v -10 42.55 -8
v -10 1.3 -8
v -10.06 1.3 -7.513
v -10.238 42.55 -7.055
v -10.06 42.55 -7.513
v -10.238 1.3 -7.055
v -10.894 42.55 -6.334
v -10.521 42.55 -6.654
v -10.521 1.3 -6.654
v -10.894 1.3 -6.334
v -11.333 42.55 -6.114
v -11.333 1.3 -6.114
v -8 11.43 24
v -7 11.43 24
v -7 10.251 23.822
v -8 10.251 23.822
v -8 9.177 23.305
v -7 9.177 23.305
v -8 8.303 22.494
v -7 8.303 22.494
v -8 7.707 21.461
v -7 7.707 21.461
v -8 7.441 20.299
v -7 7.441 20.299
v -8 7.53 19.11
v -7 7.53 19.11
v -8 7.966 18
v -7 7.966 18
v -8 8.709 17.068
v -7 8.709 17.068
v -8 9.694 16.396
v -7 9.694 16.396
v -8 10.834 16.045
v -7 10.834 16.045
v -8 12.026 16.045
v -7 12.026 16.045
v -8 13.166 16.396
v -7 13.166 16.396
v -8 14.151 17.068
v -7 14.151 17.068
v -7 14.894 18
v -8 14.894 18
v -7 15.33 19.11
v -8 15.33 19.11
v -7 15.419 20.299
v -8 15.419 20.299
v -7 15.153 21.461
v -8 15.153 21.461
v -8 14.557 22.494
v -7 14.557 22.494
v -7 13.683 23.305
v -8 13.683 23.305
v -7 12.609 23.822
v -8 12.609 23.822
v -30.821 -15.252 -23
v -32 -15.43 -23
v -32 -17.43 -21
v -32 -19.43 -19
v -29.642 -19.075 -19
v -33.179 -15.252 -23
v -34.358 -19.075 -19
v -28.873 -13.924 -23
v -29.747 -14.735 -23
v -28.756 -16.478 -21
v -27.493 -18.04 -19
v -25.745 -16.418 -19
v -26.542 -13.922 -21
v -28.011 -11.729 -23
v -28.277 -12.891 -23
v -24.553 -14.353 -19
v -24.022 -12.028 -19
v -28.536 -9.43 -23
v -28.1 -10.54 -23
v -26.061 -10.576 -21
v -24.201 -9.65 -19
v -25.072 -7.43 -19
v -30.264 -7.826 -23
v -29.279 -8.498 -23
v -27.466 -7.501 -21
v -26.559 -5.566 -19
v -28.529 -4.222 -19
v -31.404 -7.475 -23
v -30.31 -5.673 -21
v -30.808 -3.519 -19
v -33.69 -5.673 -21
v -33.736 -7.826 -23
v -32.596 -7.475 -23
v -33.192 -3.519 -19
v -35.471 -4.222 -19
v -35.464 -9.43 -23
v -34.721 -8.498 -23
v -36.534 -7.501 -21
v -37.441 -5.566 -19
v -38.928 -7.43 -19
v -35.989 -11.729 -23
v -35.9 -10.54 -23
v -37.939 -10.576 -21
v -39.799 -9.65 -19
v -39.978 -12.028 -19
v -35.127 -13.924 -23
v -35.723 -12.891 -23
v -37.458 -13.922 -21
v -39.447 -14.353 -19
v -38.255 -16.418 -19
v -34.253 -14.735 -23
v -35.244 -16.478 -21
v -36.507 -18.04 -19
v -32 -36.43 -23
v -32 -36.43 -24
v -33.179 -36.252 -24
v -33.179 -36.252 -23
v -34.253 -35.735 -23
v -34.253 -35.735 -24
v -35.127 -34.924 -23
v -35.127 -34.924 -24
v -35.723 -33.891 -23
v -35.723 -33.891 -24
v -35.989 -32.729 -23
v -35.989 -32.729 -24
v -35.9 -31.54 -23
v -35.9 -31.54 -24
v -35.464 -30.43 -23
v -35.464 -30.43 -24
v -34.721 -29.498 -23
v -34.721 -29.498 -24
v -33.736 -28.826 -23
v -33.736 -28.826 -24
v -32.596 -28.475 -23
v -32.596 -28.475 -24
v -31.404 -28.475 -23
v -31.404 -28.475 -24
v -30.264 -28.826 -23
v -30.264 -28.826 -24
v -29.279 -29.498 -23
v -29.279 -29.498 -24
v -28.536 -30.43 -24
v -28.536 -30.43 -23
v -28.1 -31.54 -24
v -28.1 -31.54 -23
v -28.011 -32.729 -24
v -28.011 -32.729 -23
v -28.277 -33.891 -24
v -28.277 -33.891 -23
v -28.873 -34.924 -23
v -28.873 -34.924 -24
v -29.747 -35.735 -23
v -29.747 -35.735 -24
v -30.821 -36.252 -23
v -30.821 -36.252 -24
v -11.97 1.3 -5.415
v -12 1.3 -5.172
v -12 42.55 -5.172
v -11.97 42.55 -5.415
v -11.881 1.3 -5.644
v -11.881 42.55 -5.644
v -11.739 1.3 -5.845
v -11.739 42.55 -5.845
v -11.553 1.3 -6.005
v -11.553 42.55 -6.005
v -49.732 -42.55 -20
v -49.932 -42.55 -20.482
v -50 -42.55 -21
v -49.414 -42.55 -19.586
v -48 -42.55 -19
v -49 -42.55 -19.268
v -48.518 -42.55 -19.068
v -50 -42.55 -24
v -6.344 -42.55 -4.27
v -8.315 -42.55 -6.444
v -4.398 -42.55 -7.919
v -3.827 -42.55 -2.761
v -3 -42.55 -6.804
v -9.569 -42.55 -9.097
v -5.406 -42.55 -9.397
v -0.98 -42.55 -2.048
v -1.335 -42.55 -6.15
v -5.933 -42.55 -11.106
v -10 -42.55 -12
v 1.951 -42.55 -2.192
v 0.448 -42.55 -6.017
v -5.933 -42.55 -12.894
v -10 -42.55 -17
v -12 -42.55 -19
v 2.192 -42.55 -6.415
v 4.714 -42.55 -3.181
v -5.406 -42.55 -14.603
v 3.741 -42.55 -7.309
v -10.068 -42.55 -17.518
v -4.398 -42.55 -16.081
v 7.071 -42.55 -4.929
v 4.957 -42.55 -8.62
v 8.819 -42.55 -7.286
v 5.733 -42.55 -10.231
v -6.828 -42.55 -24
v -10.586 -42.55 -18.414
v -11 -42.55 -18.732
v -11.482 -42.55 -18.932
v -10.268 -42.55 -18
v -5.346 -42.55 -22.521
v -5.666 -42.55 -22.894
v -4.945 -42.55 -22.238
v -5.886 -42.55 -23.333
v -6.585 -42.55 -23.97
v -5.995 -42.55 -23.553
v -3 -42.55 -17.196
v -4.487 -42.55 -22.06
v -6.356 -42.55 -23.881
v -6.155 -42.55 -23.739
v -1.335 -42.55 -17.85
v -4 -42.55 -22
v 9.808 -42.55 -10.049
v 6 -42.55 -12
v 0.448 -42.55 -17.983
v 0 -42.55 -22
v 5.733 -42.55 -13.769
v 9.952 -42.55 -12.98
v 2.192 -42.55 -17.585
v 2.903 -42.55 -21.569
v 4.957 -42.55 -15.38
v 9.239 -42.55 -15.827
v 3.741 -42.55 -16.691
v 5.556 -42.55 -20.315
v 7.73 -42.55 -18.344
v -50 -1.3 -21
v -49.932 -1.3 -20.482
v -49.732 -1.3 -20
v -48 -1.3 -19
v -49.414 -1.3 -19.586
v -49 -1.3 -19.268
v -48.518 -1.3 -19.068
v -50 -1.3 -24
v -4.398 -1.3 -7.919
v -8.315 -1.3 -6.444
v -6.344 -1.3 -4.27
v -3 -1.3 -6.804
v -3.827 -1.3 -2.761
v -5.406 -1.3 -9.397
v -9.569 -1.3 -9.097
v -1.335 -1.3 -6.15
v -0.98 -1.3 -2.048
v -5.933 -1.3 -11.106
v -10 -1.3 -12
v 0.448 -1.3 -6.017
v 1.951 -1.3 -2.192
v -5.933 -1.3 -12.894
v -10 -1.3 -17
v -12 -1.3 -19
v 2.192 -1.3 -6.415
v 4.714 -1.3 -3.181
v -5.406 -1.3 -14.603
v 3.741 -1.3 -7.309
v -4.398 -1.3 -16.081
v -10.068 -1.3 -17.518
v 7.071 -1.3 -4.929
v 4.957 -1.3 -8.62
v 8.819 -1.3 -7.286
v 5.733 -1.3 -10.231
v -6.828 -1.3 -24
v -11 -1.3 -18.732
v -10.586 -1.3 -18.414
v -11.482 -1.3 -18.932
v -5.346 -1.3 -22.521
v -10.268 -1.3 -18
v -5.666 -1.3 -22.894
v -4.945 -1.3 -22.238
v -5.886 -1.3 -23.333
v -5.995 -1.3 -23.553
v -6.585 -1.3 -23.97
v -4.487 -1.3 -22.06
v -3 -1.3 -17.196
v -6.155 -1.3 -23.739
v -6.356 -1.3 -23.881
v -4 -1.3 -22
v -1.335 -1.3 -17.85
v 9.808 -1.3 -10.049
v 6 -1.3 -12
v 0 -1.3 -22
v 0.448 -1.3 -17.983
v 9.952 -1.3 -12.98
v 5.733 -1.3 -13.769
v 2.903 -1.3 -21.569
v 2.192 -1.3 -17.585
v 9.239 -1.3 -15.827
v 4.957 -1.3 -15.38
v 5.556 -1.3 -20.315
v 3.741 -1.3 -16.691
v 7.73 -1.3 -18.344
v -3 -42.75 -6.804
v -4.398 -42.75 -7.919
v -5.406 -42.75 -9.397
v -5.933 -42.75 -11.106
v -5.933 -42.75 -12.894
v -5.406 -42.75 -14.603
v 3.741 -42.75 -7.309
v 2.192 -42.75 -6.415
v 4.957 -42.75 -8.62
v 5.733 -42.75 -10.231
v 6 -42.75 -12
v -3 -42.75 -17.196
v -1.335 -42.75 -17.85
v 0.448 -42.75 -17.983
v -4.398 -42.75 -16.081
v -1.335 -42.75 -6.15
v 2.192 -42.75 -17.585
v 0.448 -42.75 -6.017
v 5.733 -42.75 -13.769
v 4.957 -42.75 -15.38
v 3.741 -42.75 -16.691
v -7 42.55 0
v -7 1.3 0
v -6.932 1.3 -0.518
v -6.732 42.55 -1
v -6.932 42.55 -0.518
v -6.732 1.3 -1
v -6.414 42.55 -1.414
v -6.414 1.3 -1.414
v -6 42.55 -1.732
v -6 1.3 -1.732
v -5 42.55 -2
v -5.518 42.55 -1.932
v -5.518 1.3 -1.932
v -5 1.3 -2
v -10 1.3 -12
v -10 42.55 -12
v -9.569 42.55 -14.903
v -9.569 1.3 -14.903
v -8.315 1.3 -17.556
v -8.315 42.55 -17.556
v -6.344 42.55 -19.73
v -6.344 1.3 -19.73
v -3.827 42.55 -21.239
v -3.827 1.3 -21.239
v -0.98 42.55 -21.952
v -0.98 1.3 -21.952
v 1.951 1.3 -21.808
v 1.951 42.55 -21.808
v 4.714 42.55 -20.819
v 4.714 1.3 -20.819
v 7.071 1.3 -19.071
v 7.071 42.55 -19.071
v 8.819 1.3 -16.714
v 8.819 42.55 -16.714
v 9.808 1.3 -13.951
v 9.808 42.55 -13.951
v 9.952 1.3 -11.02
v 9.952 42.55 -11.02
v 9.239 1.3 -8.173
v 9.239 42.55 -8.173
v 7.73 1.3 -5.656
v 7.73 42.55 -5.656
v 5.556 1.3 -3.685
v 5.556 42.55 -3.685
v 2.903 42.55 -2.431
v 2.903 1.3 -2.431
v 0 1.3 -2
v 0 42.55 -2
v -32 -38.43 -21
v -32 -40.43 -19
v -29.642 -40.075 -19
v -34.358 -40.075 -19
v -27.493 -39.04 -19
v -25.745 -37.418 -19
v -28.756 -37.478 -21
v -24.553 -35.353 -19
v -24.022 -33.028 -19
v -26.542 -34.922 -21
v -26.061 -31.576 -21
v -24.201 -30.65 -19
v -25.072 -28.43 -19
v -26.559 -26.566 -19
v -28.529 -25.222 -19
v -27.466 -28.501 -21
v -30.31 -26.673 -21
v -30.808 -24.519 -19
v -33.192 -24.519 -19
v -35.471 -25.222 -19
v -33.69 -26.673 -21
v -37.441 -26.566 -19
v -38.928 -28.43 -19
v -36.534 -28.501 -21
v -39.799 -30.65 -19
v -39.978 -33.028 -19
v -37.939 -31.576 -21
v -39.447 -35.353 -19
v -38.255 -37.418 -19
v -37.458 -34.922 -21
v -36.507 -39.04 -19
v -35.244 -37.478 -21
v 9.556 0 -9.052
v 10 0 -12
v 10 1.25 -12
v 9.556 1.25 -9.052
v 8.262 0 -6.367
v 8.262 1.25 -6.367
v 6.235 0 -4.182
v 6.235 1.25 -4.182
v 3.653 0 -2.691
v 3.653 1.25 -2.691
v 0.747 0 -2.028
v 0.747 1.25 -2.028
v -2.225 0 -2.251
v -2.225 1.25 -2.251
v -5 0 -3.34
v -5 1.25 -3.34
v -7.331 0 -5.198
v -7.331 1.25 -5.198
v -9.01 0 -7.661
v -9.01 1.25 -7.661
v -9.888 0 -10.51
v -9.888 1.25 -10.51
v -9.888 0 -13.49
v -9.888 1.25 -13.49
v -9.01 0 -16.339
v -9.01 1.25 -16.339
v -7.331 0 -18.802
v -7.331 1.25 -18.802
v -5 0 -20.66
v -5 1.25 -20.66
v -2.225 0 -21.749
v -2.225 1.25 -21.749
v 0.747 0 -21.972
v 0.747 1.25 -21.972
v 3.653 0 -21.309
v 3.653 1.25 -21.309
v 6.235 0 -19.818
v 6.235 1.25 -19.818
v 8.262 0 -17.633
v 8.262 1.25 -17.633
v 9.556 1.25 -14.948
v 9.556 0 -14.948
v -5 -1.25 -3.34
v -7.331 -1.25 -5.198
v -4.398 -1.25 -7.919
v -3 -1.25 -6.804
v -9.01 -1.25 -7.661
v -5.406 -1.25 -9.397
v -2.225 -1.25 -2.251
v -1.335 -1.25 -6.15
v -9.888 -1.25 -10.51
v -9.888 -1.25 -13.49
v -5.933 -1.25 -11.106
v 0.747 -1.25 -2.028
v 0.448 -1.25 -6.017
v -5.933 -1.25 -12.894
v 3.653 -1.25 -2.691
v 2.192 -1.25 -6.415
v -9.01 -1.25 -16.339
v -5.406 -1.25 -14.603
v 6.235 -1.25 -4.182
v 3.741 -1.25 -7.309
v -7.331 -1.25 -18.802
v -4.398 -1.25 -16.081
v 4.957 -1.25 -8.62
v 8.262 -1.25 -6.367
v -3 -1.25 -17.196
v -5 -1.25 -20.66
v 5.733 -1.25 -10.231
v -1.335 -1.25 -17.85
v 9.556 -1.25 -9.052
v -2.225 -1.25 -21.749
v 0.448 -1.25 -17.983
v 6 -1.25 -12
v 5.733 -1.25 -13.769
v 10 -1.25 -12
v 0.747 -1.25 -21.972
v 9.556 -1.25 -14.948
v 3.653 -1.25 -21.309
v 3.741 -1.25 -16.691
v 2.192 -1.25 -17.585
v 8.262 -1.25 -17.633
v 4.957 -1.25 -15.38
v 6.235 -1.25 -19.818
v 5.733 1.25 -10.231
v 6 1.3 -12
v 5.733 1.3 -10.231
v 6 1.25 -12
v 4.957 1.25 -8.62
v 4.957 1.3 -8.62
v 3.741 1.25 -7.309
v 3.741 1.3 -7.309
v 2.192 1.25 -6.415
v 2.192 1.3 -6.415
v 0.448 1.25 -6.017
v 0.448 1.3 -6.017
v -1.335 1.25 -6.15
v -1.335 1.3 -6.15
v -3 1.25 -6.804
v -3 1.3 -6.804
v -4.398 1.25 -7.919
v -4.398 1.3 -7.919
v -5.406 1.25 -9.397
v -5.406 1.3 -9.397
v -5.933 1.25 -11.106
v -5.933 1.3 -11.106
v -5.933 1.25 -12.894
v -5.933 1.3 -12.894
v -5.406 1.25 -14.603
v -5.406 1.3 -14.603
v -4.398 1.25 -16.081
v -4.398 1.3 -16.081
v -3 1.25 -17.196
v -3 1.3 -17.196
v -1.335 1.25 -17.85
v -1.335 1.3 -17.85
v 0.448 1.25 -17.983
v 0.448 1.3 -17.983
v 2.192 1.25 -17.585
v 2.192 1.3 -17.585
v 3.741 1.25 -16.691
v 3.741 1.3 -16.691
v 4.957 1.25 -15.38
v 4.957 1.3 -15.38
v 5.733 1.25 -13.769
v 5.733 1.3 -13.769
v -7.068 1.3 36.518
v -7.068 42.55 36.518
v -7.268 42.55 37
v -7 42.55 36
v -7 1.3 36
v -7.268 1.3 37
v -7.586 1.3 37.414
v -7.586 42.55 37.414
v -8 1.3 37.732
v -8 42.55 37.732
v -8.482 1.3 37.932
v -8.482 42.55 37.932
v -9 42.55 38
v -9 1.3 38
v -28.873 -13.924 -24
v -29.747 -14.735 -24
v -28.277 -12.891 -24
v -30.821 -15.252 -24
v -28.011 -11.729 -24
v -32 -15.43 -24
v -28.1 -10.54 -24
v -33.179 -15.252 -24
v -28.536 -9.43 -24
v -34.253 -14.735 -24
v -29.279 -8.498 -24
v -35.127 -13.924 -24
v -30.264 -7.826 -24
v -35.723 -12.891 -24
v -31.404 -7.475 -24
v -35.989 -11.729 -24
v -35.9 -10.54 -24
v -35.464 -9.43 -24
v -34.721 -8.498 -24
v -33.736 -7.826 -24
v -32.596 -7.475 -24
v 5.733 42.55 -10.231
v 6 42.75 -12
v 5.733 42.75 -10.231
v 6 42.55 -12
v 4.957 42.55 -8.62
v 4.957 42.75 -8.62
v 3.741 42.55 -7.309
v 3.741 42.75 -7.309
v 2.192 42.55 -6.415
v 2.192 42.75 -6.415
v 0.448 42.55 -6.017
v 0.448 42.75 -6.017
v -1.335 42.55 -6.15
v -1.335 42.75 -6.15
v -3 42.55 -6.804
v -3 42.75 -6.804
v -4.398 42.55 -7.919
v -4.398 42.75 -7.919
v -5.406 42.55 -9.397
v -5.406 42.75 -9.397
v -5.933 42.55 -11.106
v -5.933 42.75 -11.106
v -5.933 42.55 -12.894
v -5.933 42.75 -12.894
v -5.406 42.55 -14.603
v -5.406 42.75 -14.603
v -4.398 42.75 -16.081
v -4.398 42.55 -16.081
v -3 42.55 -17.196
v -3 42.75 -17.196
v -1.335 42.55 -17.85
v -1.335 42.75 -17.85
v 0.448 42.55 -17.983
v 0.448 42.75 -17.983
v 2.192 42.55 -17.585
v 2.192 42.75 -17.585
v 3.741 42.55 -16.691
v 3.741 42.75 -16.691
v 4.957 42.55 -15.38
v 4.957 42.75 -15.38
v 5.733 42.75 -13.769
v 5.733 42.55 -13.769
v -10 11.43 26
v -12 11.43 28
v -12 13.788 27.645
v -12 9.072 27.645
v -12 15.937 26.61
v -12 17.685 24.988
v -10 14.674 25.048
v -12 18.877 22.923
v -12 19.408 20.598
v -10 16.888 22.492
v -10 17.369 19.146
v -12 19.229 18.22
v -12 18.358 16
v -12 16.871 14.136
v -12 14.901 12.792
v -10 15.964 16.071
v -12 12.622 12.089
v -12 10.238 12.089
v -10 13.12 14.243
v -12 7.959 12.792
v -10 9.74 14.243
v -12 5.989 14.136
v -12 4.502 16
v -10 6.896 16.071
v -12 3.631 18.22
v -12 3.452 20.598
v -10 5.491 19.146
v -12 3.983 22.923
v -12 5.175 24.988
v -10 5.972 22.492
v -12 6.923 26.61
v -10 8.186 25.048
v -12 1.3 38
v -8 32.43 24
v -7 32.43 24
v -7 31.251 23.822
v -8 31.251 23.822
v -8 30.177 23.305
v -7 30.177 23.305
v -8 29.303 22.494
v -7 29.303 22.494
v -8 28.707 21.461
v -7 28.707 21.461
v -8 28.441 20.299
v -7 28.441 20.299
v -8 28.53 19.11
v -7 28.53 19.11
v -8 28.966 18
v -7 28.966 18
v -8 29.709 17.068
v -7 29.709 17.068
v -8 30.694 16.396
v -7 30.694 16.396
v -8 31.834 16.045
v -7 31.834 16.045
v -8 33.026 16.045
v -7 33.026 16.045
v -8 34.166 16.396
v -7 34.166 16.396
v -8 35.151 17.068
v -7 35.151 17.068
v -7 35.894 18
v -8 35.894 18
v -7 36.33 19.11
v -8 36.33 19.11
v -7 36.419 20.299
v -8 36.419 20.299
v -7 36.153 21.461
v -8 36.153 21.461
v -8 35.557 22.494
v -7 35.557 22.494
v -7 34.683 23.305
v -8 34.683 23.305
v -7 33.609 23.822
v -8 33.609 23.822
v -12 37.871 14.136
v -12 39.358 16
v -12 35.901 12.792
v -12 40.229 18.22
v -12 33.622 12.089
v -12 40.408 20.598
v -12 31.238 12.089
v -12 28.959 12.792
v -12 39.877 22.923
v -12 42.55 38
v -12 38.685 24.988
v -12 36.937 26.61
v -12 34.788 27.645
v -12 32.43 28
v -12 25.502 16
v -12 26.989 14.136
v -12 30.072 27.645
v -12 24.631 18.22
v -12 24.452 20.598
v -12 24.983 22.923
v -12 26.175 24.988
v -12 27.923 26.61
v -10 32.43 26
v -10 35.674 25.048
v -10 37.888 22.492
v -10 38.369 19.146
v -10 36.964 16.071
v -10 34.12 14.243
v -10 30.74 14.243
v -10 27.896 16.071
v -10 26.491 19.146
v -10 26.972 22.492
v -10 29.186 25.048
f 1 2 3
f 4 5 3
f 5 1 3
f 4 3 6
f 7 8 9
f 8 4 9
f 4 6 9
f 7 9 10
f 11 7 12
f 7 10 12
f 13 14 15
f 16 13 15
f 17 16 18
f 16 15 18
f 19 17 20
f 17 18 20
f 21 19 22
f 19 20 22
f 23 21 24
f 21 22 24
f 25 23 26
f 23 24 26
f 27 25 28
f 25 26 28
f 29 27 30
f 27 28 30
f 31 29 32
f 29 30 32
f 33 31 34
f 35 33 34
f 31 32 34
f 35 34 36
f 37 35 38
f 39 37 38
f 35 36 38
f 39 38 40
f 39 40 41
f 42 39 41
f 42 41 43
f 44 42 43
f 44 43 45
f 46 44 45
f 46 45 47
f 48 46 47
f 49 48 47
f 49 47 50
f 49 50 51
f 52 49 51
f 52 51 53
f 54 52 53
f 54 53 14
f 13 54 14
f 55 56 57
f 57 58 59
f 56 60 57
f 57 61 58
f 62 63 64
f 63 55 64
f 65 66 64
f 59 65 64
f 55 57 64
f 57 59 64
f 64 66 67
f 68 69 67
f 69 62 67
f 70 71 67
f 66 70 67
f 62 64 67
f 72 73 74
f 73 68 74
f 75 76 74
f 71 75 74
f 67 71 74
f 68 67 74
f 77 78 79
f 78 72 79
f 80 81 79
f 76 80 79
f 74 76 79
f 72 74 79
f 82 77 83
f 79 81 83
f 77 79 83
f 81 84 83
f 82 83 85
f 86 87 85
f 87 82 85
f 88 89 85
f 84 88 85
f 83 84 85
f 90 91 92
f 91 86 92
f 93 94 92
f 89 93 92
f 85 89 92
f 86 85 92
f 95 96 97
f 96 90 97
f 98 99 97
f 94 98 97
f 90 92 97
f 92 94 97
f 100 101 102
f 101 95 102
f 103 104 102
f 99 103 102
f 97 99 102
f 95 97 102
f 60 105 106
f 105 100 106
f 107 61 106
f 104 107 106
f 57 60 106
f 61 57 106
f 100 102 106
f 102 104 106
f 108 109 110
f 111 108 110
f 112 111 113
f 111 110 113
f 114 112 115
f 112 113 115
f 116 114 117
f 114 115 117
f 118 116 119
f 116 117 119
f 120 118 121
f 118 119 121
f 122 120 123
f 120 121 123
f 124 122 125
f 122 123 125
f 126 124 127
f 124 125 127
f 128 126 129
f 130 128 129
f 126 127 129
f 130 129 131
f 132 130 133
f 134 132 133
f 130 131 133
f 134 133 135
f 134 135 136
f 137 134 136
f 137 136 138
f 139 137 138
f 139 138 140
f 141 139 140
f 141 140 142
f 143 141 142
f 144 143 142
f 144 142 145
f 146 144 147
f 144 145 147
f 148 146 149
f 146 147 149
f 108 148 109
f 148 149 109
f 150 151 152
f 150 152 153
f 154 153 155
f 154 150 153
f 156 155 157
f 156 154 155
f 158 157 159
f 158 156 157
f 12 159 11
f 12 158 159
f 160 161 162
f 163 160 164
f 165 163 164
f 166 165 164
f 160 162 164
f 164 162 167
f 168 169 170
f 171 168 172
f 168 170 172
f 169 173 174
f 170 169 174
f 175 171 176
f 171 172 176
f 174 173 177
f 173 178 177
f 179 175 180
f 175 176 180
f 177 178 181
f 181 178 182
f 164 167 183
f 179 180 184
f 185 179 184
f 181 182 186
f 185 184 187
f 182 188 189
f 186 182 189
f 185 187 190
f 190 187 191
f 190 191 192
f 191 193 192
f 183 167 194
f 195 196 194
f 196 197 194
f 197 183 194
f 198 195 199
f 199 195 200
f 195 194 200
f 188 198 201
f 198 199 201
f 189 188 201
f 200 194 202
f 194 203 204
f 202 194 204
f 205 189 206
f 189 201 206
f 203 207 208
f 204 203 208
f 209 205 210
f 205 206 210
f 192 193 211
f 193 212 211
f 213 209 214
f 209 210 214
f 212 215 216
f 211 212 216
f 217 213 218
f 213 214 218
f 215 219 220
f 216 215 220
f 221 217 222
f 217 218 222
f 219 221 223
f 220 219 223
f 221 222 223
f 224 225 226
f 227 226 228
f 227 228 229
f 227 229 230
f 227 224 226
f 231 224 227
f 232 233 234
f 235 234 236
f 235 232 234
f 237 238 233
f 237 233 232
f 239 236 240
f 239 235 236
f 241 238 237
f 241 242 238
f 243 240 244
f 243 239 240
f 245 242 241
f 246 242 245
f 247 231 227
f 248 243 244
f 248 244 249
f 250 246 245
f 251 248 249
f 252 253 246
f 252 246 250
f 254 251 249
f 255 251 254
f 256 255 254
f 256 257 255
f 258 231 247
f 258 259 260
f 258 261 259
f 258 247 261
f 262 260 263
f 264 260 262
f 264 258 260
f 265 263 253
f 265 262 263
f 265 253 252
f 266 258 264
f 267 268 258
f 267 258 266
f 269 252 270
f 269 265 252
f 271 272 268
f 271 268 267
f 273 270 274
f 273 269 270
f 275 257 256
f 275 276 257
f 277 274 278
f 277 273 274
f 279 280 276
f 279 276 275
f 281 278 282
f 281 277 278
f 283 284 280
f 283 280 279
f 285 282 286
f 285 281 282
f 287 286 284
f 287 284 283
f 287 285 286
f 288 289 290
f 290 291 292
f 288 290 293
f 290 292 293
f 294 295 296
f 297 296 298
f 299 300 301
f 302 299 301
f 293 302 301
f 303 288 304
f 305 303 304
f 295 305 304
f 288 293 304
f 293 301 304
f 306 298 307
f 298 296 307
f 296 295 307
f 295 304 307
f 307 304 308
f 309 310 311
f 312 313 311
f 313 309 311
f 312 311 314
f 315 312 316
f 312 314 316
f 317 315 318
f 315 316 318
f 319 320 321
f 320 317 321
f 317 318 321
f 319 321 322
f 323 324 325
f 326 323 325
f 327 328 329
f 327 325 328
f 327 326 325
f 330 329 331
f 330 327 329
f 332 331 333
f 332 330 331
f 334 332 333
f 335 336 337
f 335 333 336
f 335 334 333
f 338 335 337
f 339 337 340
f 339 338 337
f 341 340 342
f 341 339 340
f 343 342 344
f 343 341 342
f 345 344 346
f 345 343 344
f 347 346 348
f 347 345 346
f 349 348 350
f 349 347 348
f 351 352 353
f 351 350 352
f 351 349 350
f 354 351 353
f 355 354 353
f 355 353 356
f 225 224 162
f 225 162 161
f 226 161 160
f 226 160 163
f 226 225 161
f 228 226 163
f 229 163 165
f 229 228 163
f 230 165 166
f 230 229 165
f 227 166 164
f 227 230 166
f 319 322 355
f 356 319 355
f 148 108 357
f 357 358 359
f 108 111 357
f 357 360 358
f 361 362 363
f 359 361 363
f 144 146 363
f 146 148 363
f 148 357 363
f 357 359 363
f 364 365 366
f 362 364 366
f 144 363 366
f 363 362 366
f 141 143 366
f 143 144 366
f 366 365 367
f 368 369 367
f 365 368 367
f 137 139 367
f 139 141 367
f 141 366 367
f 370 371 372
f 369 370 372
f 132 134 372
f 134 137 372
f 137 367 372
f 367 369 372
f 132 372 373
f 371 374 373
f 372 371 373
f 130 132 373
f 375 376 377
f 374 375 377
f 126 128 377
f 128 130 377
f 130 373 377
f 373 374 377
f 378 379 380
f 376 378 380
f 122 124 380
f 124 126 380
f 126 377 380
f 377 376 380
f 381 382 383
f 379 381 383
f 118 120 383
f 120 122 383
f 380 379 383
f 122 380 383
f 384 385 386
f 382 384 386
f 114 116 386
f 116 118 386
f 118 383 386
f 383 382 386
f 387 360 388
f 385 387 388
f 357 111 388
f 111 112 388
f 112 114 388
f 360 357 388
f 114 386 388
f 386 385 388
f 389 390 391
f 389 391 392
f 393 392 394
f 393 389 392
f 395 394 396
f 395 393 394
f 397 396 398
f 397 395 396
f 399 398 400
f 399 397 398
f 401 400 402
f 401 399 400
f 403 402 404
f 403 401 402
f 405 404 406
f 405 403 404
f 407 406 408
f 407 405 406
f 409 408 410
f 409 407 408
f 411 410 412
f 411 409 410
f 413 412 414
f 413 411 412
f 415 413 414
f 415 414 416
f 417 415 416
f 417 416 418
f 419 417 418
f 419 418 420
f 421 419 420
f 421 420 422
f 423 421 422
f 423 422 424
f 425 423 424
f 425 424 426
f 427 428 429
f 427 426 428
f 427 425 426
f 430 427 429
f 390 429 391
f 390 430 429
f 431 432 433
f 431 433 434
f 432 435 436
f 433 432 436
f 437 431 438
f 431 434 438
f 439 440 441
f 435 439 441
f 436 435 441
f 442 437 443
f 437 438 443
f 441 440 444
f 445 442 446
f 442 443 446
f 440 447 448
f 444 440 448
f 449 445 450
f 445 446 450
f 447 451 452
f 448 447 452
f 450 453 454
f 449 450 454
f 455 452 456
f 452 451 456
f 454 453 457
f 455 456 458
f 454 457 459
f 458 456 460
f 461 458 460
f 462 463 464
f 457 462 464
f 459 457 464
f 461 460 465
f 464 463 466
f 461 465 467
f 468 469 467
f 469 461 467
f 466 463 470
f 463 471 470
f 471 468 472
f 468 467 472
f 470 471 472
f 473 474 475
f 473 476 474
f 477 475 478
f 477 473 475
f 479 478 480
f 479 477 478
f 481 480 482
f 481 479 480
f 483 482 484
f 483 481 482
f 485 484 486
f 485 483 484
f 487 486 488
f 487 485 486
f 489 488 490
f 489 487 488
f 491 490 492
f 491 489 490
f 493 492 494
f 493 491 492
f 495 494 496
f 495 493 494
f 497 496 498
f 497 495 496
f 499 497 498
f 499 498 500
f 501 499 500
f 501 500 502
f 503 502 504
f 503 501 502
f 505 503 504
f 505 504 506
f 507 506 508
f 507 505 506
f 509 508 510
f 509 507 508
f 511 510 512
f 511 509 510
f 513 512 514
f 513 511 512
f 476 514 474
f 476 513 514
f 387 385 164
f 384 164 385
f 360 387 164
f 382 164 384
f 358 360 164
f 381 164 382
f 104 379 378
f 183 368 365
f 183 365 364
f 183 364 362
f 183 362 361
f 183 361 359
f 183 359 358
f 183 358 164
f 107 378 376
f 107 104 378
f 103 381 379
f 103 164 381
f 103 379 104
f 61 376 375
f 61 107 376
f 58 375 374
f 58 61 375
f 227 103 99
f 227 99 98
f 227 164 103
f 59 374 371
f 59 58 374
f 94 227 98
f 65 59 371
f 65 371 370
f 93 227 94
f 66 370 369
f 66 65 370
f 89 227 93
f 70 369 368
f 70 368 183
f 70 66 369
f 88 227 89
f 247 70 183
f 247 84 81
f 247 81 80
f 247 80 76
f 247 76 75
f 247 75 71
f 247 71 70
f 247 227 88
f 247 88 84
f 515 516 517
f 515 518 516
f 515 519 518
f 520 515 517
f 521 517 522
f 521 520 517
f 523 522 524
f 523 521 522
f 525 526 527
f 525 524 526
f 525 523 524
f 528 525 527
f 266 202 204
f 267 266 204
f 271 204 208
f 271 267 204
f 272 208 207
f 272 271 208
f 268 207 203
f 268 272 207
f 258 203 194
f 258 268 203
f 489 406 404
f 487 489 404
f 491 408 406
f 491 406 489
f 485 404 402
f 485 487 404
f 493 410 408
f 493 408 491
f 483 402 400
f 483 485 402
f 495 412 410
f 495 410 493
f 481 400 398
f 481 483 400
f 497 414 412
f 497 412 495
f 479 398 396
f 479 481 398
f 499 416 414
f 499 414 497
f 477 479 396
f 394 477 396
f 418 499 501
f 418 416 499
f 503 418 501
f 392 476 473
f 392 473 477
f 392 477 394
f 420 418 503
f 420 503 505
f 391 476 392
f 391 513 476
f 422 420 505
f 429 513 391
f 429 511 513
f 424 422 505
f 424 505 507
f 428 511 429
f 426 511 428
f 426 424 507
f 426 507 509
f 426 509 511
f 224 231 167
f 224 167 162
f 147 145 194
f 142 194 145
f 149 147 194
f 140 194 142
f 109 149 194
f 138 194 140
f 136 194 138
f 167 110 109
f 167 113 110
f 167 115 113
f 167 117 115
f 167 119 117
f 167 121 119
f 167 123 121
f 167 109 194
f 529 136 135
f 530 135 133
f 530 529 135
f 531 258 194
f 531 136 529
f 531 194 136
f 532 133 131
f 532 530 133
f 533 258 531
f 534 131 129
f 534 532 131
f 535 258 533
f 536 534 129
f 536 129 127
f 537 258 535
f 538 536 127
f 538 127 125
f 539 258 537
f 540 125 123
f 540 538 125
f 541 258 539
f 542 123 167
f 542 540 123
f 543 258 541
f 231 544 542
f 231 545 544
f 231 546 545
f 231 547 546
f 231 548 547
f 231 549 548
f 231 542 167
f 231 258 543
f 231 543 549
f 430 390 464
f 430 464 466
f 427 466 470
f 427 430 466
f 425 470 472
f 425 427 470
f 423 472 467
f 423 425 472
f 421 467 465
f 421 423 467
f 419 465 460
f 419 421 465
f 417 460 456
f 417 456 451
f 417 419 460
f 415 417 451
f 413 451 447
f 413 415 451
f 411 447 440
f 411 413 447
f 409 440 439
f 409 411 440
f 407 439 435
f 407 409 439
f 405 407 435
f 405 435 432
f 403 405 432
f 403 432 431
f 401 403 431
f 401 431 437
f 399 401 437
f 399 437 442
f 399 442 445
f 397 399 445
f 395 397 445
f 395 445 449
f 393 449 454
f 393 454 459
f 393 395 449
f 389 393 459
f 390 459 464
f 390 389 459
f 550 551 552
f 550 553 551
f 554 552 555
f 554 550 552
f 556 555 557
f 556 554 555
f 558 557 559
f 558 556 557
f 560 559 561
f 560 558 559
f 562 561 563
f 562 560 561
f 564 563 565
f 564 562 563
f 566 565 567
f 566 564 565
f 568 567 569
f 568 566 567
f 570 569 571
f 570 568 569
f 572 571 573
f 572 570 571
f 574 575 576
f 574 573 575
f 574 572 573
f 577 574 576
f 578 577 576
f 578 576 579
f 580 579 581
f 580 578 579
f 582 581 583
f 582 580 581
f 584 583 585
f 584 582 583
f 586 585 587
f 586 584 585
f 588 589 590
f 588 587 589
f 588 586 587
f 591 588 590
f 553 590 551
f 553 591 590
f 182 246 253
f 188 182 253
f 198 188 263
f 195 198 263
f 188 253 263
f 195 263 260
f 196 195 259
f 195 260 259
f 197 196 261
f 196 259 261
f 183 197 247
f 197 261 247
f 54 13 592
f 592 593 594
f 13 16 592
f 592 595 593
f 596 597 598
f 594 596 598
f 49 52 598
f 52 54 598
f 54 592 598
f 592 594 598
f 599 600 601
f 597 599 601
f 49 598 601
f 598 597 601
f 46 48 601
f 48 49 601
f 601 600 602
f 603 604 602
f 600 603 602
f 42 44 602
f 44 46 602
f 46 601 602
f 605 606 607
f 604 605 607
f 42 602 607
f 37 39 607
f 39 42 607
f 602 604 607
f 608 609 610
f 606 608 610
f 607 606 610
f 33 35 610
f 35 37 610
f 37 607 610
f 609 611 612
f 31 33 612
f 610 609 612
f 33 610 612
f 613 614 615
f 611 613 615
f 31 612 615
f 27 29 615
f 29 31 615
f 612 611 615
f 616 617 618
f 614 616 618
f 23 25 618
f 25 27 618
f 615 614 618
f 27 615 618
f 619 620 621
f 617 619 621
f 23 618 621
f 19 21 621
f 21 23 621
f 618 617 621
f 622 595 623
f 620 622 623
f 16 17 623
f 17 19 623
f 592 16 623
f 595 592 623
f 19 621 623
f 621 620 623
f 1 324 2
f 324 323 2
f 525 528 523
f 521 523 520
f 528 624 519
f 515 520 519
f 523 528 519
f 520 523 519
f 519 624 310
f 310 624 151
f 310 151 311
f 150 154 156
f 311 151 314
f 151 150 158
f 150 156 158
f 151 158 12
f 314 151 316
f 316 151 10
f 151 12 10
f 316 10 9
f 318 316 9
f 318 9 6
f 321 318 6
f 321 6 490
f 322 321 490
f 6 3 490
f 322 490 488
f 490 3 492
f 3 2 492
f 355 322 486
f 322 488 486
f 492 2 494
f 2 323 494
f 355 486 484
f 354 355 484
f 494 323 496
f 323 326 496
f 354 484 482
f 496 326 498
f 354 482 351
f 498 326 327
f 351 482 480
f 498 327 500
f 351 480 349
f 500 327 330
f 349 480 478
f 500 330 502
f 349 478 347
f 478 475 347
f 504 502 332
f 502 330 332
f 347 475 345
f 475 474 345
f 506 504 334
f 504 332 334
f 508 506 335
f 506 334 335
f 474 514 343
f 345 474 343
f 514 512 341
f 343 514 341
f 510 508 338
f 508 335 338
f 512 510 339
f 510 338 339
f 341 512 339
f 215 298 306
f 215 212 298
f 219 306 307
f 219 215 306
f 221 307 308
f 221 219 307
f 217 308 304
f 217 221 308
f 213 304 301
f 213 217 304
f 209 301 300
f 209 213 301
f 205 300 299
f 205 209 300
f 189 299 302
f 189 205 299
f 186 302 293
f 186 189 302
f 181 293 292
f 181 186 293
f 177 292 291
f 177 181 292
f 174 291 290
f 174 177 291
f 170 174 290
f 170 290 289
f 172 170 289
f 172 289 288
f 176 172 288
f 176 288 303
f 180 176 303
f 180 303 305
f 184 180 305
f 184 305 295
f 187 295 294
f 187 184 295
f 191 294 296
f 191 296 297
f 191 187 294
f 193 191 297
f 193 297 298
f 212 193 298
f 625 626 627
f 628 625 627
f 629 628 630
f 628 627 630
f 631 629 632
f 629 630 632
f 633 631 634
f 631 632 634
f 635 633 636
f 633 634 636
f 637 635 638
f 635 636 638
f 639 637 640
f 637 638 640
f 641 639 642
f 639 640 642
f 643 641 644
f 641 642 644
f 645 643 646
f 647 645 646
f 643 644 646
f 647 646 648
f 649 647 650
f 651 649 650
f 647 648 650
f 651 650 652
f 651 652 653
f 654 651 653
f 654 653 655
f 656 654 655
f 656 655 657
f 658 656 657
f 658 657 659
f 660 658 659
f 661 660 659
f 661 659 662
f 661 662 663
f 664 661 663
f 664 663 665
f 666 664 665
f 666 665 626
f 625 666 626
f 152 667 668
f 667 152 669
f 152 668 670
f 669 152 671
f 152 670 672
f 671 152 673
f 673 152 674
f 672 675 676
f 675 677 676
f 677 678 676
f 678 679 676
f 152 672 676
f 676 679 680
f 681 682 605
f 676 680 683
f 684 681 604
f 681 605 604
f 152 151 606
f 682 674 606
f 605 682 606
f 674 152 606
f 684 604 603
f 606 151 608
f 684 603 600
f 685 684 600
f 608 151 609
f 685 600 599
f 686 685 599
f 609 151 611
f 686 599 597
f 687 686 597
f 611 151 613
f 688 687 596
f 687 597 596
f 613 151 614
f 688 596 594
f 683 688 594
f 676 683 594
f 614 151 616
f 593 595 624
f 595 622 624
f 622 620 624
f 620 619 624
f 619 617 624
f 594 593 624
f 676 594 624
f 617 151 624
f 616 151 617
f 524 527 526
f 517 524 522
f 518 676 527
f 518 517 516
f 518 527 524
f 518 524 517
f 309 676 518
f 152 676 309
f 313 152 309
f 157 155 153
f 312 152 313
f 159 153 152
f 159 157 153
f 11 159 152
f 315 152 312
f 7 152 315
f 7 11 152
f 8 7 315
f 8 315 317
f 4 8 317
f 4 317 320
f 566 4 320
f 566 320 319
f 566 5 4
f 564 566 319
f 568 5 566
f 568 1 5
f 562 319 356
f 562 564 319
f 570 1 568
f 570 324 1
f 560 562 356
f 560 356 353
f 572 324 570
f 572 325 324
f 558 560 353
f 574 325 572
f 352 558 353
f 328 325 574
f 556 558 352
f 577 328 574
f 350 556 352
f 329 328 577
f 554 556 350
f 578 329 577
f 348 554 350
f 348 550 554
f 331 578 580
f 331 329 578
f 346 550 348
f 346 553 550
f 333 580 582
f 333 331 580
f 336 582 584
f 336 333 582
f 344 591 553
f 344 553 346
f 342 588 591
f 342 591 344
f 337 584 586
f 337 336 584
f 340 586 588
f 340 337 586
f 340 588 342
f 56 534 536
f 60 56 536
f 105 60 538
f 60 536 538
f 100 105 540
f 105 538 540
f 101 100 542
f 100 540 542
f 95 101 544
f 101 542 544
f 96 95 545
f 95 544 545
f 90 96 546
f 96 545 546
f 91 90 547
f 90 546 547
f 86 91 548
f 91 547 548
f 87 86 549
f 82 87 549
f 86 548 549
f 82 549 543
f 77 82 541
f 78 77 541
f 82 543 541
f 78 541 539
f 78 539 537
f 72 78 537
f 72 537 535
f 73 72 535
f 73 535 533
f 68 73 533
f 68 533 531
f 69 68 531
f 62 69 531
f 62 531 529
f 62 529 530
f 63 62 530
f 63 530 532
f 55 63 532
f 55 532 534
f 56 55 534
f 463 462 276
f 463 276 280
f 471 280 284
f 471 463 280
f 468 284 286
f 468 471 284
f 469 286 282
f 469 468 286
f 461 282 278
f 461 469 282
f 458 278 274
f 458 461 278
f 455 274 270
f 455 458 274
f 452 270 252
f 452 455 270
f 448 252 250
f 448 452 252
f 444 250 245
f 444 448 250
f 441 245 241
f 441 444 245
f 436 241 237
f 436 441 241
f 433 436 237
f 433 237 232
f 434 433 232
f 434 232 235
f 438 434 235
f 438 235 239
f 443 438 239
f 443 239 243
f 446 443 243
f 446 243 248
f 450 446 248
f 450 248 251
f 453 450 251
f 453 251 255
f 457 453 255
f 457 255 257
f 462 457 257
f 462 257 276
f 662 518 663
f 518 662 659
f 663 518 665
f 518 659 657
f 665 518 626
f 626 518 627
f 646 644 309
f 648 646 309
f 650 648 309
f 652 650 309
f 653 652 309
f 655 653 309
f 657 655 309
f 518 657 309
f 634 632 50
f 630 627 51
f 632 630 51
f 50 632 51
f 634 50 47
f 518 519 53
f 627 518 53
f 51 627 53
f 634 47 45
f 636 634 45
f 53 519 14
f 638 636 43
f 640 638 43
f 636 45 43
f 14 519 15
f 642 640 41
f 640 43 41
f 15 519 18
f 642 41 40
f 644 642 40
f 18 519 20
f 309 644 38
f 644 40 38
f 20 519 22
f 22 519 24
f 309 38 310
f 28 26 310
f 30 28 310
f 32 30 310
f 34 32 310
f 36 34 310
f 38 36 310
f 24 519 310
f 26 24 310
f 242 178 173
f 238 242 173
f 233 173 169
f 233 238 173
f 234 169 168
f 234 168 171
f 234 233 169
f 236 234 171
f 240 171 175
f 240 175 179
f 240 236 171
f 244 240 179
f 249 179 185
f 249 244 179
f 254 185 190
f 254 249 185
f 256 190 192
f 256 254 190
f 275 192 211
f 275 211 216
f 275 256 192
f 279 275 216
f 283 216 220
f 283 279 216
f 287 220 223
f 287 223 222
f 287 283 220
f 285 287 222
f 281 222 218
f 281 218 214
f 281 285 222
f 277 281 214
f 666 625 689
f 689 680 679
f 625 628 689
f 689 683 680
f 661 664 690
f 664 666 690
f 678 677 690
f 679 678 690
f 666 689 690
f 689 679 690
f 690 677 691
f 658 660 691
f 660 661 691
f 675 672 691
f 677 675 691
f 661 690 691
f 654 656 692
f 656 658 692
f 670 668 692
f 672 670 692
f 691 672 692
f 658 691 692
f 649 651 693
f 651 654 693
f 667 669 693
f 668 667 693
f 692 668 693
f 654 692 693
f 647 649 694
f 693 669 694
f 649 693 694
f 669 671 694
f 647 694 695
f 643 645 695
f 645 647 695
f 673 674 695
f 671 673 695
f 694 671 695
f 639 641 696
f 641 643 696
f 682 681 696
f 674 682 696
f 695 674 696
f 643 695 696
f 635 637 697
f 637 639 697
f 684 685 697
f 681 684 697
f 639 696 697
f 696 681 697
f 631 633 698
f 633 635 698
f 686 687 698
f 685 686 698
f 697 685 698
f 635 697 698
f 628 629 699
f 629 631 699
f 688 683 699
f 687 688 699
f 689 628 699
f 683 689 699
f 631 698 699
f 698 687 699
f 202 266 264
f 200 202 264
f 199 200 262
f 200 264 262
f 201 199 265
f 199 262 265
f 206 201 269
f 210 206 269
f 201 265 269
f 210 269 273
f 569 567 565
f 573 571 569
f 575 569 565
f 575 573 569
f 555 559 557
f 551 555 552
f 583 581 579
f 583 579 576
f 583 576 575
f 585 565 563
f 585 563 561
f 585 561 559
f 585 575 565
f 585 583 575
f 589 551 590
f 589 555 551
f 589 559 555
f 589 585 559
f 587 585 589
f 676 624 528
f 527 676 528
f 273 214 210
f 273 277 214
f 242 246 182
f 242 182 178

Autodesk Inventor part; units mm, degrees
sketch "Skizze_34" plane through (0, 0, 0) normal (0, 1, 0) x (1, 0, 0)
  circle A0 centre (0, 12) radius 10
extrude "Extrusion1" add sketch "Skizze_34" along normal mid plane 2.5
sketch "Skizze_35" plane through (0, 0, 0) normal (0, 1, 0) x (1, 0, 0)
  circle A0 centre (0, 12) radius 6
extrude "Extrusion2" add sketch "Skizze_35" along normal mid plane 85.5
sketch "Skizze_36" plane through (0, -1.3, 0) normal (0, 1, 0) x (1, 0, 0)
  line L0 (-50, 24) -> (-50, 21)
  arc A0 (-50, 21) -> (-48, 19) centre (-48, 21) ccw
  line L1 (-48, 19) -> (-12, 19)
  arc A1 (-10, 17) -> (-12, 19) centre (-12, 17) ccw
  line L2 (-10, 17) -> (-10, 12)
  arc A2 (-10, 12) -> (0, 22) centre (0, 12) ccw
  line L3 (0, 22) -> (-4, 22)
  arc A3 (-5.8856, 23.3333) -> (-4, 22) centre (-4, 24) ccw
  arc A4 (-5.8856, 23.3333) -> (-6.8284, 24) centre (-6.8284, 23) ccw
  line L4 (-6.8284, 24) -> (-50, 24)
  circle A5 centre (0, 12) radius 6
extrude "Extrusion3" add sketch "Skizze_36" against normal blind 41.25
sketch "Skizze_37" plane through (0, 1.3, 0) normal (0, 1, 0) x (1, 0, 0)
  line L0 (-12, -38) -> (-9, -38)
  arc A0 (-9, -38) -> (-7, -36) centre (-9, -36) ccw
  line L1 (-7, -36) -> (-7, 0)
  arc A1 (-5, 2) -> (-7, 0) centre (-5, 0) ccw
  line L2 (-5, 2) -> (0, 2)
  arc A2 (0, 2) -> (-10, 12) centre (0, 12) ccw
  line L3 (-10, 12) -> (-10, 8)
  arc A3 (-11.3333, 6.1144) -> (-10, 8) centre (-12, 8) ccw
  arc A4 (-11.3333, 6.1144) -> (-12, 5.1716) centre (-11, 5.1716) ccw
  line L4 (-12, 5.1716) -> (-12, -38)
  circle A5 centre (0, 12) radius 6
extrude "Extrusion4" add sketch "Skizze_37" along normal blind 41.25
sketch "Sketch5" plane through (-12, 1.3, -5.1716) normal (-1, 0, 0) x (0, 0, 1)
  point P0 (25.1716, 10.13)
hole "Drilling 1" at (-12, 11.43, 20) direction (1, 0, 0) diameter 8 depth 5 countersink diameter 16 countersink angle 90
sketch "Sketch6" plane through (-12, 1.3, -5.1716) normal (-1, 0, 0) x (0, 0, 1)
  point P0 (25.1716, 31.13)
hole "Drilling 2" at (-12, 32.43, 20) direction (1, 0, 0) diameter 8 depth 5 countersink diameter 16 countersink angle 90
sketch "Sketch7" plane through (-48, -1.3, -19) normal (0, 0, 1) x (1, 0, 0)
  point P0 (16, -10.13)
hole "Drilling 3" at (-32, -11.43, -19) direction (0, 0, -1) diameter 8 depth 5 countersink diameter 16 countersink angle 90
sketch "Sketch8" plane through (-48, -1.3, -19) normal (0, 0, 1) x (1, 0, 0)
  point P0 (16, -31.13)
hole "Drilling 4" at (-32, -32.43, -19) direction (0, 0, -1) diameter 8 depth 5 countersink diameter 16 countersink angle 90
ref_plane "side_2a_XY" through (-32, -21.925, -19) normal (0, 0, 1) x (1, 0, 0)
ref_plane "side_2a_YZ" through (-32, -21.925, -19) normal (1, 0, 0) x (0, 1, 0)
ref_plane "side_2a_ZX" through (-32, -21.925, -19) normal (0, 1, 0) x (0, 0, 1)
ref_plane "side_2b_XY" through (-32, -21.925, -24) normal (0, 0, -1) x (1, 0, 0)
ref_plane "side_2b_YZ" through (-32, -21.925, -24) normal (1, 0, 0) x (0, -1, 0)
ref_plane "side_2b_ZX" through (-32, -21.925, -24) normal (0, -1, 0) x (0, 0, -1)
ref_plane "side_1b_XY" through (-7, 21.925, 20) normal (1, 0, 0) x (0, 0, -1)
ref_plane "side_1b_YZ" through (-7, 21.925, 20) normal (0, 0, -1) x (0, 1, 0)
ref_plane "side_1b_ZX" through (-7, 21.925, 20) normal (0, 1, 0) x (1, 0, 0)
ref_plane "side_3b_XY" through (-7, 21.925, 20) normal (1, 0, 0) x (0, 0, -1)
ref_plane "side_3b_YZ" through (-7, 21.925, 20) normal (0, 0, -1) x (0, 1, 0)
ref_plane "side_3b_ZX" through (-7, 21.925, 20) normal (0, 1, 0) x (1, 0, 0)
ref_plane "side_1a_XY" through (-12, 21.925, 20) normal (-1, 0, 0) x (0, 0, -1)
ref_plane "side_1a_YZ" through (-12, 21.925, 20) normal (0, 0, -1) x (0, -1, 0)
ref_plane "side_1a_ZX" through (-12, 21.925, 20) normal (0, -1, 0) x (-1, 0, 0)
ref_plane "side_3a_XY" through (-12, 21.925, 20) normal (-1, 0, 0) x (0, 0, -1)
ref_plane "side_3a_YZ" through (-12, 21.925, 20) normal (0, 0, -1) x (0, -1, 0)
ref_plane "side_3a_ZX" through (-12, 21.925, 20) normal (0, -1, 0) x (-1, 0, 0)
properties part number "MayTec 1.62.842032085_Alu hinges, heavy, type 20 PG 40 (90)"
